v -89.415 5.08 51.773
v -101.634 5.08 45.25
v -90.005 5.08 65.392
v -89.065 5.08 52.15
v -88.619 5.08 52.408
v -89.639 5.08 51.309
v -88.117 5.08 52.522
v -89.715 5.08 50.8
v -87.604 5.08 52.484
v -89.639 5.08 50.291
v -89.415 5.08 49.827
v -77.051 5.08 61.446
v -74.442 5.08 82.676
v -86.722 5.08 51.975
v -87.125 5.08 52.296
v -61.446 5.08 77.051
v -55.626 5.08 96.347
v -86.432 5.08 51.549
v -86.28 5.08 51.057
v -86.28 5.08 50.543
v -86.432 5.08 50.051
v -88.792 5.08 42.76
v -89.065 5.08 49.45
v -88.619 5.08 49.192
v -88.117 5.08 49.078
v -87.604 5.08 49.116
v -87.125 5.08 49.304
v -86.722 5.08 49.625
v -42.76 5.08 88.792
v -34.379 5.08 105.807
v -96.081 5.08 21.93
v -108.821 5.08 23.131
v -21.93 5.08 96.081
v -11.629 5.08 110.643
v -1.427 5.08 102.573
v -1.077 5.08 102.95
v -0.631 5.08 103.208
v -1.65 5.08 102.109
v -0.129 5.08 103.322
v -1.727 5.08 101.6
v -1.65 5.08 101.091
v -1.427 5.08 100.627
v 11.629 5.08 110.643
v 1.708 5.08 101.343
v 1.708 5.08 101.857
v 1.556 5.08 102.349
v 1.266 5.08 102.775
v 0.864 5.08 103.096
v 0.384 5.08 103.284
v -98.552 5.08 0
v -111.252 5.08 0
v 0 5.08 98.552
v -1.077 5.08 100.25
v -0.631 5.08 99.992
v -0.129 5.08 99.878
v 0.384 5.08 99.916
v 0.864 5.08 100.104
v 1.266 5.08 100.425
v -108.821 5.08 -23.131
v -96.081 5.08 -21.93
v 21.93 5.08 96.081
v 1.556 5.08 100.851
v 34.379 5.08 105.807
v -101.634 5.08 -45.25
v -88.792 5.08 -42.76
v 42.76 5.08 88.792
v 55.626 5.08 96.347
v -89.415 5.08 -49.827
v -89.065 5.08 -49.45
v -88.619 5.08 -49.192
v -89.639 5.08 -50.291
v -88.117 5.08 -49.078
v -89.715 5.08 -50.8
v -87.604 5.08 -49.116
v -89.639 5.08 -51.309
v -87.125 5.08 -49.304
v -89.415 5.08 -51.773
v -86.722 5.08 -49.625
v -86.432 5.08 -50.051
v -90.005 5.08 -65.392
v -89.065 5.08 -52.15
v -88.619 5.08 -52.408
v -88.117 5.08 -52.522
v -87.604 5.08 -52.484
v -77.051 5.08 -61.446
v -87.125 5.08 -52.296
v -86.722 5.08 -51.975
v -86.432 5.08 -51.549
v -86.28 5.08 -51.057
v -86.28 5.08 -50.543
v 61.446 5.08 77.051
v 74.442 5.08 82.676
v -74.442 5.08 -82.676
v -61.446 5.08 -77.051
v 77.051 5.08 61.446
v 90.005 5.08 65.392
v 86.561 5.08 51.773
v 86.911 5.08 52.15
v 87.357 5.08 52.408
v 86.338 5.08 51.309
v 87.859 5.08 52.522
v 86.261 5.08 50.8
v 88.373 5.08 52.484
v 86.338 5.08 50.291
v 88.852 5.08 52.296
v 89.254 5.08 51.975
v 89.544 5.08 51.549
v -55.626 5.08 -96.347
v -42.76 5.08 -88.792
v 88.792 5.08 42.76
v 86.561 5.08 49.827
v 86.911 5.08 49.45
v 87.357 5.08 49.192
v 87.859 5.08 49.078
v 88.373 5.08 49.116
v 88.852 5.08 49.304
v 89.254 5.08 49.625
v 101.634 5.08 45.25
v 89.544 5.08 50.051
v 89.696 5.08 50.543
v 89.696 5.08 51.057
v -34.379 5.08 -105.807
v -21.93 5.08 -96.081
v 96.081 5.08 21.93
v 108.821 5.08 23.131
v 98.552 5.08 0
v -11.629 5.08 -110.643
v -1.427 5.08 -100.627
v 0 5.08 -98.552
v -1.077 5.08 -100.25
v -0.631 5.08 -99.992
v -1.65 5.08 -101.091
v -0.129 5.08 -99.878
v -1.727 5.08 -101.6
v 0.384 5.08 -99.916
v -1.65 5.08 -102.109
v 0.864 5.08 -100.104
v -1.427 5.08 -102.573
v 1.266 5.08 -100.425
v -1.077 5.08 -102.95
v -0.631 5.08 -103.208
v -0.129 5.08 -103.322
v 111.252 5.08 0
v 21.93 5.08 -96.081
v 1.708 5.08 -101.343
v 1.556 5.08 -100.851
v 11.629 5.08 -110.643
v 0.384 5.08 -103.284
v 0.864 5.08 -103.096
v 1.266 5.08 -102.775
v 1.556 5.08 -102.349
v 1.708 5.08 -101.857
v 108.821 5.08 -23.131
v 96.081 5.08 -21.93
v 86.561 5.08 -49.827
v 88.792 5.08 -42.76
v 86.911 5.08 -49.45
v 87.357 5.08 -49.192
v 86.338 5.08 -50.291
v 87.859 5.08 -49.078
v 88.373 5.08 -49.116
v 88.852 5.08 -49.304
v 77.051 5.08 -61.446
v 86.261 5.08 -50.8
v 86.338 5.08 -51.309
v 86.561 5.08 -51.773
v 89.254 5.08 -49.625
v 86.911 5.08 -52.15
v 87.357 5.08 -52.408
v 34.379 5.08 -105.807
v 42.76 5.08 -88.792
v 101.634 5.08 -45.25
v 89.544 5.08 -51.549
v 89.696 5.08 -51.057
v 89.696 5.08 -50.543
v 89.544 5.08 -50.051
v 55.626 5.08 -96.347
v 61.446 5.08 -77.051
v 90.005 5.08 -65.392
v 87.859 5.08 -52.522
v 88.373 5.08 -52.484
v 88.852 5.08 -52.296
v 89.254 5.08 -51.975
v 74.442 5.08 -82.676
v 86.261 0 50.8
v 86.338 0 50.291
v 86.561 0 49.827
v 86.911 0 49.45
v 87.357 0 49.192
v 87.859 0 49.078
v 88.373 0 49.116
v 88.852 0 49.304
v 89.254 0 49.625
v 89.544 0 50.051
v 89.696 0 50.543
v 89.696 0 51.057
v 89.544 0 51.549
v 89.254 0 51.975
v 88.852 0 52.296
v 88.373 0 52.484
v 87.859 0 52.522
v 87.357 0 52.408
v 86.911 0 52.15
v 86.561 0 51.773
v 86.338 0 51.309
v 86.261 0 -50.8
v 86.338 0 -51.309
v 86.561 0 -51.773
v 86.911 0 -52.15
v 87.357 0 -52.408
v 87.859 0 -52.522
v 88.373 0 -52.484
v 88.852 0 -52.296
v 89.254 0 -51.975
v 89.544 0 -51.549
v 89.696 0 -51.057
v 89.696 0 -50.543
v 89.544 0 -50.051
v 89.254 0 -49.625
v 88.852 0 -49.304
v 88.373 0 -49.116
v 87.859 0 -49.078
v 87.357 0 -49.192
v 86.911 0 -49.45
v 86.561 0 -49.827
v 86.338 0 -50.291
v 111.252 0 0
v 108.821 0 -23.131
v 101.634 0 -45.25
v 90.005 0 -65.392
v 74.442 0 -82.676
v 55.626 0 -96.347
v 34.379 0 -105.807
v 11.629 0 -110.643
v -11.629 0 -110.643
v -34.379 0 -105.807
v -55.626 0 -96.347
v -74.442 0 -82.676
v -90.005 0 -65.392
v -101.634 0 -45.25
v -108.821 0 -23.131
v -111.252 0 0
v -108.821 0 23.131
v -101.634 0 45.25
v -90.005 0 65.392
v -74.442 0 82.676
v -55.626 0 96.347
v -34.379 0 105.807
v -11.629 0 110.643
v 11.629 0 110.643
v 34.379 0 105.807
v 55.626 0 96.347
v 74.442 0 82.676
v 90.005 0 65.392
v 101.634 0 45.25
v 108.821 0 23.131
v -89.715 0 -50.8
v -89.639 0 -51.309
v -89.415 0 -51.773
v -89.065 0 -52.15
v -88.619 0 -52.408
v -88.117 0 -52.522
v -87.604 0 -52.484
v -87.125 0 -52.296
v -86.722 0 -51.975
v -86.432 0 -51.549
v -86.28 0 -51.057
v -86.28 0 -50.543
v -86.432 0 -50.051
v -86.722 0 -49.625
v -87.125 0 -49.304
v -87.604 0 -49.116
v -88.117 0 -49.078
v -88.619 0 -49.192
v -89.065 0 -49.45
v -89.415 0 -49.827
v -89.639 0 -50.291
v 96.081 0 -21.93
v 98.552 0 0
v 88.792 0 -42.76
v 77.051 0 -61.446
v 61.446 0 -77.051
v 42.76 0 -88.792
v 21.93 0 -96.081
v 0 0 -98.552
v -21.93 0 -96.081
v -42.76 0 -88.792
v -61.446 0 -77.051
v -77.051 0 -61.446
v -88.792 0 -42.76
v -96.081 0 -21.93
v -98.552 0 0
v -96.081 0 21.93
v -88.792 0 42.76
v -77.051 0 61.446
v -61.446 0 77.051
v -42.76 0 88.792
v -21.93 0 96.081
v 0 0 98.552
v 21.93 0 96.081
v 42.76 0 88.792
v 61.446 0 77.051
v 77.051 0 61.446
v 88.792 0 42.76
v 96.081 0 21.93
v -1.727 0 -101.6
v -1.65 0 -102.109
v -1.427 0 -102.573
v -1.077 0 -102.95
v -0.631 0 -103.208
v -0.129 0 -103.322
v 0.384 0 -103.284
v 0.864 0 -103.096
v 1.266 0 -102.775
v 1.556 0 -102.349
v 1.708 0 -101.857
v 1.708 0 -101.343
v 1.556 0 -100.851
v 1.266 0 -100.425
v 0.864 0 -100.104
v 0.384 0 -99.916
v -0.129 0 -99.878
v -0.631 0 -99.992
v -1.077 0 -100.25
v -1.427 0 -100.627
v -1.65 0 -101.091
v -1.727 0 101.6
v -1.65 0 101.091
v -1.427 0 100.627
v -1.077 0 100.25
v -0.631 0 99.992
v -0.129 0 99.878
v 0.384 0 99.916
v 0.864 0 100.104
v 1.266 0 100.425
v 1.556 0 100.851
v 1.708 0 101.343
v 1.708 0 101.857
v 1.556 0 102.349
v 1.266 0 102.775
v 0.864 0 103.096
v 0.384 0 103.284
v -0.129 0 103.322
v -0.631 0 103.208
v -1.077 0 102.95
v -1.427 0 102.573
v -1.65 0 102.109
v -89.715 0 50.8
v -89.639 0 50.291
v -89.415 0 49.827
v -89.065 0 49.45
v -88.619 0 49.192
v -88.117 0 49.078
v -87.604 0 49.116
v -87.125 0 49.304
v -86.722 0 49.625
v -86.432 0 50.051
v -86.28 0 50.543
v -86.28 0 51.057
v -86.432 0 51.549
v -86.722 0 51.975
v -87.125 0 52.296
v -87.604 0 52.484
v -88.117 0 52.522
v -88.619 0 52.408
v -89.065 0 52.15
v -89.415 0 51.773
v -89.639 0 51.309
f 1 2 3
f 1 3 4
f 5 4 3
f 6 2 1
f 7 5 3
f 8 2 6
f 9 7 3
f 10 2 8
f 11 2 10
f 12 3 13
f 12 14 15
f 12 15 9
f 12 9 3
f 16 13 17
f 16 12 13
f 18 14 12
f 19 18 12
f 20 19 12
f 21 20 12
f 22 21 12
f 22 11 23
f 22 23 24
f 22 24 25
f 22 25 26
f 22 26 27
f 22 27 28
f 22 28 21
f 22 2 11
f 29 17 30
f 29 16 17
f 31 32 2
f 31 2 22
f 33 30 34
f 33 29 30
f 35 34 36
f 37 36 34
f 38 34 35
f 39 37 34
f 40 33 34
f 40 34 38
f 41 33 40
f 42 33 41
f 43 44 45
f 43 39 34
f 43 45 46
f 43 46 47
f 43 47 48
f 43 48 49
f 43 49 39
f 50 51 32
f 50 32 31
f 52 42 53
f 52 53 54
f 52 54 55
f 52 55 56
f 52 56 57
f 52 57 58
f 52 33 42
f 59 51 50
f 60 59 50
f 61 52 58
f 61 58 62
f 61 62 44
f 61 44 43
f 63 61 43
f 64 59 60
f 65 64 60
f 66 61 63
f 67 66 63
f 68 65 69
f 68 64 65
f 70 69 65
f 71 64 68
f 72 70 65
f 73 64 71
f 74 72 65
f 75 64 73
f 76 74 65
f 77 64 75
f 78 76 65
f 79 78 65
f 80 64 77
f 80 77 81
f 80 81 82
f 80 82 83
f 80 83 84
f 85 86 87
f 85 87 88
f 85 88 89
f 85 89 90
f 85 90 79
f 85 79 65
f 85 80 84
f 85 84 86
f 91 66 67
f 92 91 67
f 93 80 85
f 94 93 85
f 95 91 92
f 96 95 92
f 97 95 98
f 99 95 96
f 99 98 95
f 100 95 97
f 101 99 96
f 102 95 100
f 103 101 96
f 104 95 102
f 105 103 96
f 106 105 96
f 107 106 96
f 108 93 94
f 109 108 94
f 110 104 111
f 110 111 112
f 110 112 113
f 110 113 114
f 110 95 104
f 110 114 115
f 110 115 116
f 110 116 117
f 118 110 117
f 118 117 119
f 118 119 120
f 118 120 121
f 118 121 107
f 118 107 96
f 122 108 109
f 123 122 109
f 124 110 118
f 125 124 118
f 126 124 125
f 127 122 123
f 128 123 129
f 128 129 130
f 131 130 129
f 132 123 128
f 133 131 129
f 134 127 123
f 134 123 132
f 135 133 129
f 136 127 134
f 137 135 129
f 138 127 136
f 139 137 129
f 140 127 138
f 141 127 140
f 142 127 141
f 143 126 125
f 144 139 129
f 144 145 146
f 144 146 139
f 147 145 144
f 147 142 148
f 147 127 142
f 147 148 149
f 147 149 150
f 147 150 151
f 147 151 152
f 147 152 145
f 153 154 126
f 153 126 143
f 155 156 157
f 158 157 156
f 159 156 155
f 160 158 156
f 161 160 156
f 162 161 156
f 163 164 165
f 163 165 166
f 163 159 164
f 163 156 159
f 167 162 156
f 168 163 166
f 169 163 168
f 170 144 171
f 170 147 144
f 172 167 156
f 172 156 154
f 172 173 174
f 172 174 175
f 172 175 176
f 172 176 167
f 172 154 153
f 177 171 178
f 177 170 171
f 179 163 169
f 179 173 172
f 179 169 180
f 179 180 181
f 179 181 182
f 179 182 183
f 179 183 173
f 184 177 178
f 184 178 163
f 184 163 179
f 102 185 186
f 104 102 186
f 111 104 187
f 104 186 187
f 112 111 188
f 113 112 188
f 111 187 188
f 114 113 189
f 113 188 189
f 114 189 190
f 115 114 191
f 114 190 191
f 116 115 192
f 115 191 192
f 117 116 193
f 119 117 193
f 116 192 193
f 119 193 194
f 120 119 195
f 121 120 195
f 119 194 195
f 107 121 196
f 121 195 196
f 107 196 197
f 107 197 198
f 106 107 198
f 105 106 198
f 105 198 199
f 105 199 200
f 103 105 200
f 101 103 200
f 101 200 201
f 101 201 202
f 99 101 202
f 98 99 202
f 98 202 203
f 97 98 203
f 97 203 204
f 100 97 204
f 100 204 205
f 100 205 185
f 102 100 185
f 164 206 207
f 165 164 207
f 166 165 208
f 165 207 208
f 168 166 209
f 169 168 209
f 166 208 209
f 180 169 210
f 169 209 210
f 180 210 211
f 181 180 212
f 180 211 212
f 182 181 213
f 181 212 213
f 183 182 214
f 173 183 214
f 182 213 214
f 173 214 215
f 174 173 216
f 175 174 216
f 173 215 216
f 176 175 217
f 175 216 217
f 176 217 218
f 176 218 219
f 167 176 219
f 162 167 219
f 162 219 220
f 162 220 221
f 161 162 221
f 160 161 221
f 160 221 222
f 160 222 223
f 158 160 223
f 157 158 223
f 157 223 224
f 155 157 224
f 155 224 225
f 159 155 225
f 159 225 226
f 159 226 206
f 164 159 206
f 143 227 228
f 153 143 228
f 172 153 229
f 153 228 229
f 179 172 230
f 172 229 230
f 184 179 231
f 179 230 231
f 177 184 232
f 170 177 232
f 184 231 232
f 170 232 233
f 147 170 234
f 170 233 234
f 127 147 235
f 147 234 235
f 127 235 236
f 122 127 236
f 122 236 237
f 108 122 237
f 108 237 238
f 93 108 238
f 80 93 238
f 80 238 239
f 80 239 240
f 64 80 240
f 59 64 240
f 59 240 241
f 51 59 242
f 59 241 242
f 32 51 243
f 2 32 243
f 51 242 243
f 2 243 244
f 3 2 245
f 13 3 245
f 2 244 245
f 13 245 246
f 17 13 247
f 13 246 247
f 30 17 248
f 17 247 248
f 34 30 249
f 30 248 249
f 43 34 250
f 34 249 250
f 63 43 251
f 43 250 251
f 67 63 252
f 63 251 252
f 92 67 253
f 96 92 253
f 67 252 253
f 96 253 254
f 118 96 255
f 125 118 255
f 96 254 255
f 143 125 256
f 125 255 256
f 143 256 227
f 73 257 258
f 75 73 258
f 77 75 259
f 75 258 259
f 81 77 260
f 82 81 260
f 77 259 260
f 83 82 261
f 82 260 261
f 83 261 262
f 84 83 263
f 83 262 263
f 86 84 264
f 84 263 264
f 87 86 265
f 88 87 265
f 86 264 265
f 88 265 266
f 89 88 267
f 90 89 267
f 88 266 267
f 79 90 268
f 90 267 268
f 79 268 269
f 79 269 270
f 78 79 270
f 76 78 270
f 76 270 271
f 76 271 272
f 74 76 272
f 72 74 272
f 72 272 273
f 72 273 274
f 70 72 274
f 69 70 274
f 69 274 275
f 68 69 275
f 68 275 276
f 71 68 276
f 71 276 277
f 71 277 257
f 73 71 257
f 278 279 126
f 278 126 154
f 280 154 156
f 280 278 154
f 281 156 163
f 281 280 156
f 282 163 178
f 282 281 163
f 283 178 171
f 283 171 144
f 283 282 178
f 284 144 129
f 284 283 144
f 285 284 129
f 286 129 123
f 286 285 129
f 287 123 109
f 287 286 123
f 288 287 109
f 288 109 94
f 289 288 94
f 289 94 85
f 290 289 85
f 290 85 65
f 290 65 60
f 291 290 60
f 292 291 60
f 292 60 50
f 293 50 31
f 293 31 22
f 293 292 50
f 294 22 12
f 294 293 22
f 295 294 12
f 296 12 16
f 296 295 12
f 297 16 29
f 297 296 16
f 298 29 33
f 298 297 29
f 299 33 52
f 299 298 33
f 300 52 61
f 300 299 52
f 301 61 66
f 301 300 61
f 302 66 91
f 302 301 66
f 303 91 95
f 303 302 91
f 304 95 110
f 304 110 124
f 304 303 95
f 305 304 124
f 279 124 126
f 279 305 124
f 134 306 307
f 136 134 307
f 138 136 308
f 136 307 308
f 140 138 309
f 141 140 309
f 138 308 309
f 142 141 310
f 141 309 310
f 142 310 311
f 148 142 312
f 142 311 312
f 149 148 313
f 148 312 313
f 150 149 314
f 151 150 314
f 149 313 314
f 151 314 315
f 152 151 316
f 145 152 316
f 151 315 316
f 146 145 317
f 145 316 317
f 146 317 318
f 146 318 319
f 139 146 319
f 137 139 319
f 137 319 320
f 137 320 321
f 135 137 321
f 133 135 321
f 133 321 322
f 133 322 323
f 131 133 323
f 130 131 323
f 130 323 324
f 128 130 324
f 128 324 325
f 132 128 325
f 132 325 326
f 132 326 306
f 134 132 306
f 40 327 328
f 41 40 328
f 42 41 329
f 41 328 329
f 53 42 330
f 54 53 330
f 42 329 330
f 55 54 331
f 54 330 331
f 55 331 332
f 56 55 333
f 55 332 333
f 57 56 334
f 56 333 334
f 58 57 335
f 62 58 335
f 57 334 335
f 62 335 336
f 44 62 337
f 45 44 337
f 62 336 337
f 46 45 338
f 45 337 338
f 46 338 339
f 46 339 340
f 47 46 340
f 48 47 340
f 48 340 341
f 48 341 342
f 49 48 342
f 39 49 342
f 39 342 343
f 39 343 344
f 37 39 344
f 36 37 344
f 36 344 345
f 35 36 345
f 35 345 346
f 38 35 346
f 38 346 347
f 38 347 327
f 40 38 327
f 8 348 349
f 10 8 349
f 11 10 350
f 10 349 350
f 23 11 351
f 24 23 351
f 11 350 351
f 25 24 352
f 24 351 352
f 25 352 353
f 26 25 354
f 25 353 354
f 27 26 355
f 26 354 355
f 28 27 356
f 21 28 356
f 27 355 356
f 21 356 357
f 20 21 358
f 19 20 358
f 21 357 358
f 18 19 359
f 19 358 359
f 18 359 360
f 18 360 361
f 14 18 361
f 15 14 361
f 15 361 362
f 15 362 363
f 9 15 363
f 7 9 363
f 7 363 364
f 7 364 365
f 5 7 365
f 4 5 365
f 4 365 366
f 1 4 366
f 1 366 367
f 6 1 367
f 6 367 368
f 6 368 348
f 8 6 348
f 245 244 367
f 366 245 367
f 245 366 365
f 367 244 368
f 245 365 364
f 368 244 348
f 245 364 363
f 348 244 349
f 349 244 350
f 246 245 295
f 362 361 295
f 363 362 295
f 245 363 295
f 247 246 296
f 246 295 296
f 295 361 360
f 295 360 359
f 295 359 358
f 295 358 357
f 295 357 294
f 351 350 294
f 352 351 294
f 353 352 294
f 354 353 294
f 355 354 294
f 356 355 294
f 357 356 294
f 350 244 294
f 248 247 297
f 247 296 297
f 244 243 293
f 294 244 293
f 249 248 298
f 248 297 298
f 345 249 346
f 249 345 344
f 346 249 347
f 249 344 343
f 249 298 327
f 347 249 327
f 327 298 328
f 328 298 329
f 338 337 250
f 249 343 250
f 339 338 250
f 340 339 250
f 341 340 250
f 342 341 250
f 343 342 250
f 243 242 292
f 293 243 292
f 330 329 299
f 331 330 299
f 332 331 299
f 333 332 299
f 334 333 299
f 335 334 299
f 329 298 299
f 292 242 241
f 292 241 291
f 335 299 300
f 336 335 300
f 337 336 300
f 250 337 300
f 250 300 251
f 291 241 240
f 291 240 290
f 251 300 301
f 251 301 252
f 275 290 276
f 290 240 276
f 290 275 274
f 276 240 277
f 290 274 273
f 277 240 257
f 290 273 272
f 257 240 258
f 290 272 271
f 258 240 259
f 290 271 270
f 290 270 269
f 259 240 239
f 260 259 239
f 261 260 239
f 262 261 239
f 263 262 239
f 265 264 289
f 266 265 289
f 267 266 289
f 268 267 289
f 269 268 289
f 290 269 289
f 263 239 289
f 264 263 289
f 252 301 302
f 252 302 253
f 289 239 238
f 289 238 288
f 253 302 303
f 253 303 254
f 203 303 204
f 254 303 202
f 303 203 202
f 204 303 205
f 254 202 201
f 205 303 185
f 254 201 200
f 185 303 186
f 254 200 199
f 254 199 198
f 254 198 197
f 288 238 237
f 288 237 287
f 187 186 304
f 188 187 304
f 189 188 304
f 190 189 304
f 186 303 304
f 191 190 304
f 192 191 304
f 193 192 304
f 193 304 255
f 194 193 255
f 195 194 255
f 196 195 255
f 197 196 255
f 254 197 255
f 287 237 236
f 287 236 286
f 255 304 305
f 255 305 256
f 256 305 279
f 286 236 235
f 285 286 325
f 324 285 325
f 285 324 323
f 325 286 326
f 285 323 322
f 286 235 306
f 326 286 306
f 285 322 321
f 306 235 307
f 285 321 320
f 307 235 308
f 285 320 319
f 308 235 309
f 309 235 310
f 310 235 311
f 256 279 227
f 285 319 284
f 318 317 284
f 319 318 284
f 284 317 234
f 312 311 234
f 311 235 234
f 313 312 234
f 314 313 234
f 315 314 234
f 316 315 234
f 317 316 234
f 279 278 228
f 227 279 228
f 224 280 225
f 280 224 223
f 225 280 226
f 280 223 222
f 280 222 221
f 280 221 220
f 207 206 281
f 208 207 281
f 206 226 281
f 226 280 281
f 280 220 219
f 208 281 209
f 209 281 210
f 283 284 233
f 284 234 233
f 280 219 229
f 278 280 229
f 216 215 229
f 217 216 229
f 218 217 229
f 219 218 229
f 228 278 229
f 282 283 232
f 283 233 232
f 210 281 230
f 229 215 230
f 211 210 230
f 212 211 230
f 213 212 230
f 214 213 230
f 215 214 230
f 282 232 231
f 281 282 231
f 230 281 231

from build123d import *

# Parameters (mm, degrees)
SKETCH1_R                     = 111.252
SKETCH1_R_2                   = 98.552
BOSS_EXTRUDE1_DEPTH           = 5.08
TAP_DRILL_FOR_8_32_TAP1_D     = 3.4544
TAP_DRILL_FOR_8_32_TAP1_DEPTH = 25.4
TAP_DRILL_FOR_8_32_TAP1_TIP   = 1.037806461


with BuildPart() as part:
    # Sketch1 → Boss-Extrude1 (new body)
    with BuildSketch(Plane(origin=(0, 0, 0), x_dir=(1, 0, 0), z_dir=(0, 1, 0))):
        Circle(SKETCH1_R)
        Circle(SKETCH1_R_2, mode=Mode.SUBTRACT)
    extrude(amount=BOSS_EXTRUDE1_DEPTH)

    # Tap Drill for #8-32 Tap1
    with Locations(Plane(origin=(0, 5.08, 0), x_dir=(1, 0, 0), z_dir=(0, 1, 0))):
        with Locations((-87.988181024, 50.8), (0, 101.6), (87.988181024, 50.8), (87.988181024, -50.8), (0, -101.6), (-87.988181024, -50.8)):
            Hole(TAP_DRILL_FOR_8_32_TAP1_D / 2, depth=TAP_DRILL_FOR_8_32_TAP1_DEPTH)
            with Locations((0, 0, -(TAP_DRILL_FOR_8_32_TAP1_DEPTH + TAP_DRILL_FOR_8_32_TAP1_TIP / 2))):  # 118° drill point
                Cone(0, TAP_DRILL_FOR_8_32_TAP1_D / 2, TAP_DRILL_FOR_8_32_TAP1_TIP, mode=Mode.SUBTRACT)


solid = part.part
